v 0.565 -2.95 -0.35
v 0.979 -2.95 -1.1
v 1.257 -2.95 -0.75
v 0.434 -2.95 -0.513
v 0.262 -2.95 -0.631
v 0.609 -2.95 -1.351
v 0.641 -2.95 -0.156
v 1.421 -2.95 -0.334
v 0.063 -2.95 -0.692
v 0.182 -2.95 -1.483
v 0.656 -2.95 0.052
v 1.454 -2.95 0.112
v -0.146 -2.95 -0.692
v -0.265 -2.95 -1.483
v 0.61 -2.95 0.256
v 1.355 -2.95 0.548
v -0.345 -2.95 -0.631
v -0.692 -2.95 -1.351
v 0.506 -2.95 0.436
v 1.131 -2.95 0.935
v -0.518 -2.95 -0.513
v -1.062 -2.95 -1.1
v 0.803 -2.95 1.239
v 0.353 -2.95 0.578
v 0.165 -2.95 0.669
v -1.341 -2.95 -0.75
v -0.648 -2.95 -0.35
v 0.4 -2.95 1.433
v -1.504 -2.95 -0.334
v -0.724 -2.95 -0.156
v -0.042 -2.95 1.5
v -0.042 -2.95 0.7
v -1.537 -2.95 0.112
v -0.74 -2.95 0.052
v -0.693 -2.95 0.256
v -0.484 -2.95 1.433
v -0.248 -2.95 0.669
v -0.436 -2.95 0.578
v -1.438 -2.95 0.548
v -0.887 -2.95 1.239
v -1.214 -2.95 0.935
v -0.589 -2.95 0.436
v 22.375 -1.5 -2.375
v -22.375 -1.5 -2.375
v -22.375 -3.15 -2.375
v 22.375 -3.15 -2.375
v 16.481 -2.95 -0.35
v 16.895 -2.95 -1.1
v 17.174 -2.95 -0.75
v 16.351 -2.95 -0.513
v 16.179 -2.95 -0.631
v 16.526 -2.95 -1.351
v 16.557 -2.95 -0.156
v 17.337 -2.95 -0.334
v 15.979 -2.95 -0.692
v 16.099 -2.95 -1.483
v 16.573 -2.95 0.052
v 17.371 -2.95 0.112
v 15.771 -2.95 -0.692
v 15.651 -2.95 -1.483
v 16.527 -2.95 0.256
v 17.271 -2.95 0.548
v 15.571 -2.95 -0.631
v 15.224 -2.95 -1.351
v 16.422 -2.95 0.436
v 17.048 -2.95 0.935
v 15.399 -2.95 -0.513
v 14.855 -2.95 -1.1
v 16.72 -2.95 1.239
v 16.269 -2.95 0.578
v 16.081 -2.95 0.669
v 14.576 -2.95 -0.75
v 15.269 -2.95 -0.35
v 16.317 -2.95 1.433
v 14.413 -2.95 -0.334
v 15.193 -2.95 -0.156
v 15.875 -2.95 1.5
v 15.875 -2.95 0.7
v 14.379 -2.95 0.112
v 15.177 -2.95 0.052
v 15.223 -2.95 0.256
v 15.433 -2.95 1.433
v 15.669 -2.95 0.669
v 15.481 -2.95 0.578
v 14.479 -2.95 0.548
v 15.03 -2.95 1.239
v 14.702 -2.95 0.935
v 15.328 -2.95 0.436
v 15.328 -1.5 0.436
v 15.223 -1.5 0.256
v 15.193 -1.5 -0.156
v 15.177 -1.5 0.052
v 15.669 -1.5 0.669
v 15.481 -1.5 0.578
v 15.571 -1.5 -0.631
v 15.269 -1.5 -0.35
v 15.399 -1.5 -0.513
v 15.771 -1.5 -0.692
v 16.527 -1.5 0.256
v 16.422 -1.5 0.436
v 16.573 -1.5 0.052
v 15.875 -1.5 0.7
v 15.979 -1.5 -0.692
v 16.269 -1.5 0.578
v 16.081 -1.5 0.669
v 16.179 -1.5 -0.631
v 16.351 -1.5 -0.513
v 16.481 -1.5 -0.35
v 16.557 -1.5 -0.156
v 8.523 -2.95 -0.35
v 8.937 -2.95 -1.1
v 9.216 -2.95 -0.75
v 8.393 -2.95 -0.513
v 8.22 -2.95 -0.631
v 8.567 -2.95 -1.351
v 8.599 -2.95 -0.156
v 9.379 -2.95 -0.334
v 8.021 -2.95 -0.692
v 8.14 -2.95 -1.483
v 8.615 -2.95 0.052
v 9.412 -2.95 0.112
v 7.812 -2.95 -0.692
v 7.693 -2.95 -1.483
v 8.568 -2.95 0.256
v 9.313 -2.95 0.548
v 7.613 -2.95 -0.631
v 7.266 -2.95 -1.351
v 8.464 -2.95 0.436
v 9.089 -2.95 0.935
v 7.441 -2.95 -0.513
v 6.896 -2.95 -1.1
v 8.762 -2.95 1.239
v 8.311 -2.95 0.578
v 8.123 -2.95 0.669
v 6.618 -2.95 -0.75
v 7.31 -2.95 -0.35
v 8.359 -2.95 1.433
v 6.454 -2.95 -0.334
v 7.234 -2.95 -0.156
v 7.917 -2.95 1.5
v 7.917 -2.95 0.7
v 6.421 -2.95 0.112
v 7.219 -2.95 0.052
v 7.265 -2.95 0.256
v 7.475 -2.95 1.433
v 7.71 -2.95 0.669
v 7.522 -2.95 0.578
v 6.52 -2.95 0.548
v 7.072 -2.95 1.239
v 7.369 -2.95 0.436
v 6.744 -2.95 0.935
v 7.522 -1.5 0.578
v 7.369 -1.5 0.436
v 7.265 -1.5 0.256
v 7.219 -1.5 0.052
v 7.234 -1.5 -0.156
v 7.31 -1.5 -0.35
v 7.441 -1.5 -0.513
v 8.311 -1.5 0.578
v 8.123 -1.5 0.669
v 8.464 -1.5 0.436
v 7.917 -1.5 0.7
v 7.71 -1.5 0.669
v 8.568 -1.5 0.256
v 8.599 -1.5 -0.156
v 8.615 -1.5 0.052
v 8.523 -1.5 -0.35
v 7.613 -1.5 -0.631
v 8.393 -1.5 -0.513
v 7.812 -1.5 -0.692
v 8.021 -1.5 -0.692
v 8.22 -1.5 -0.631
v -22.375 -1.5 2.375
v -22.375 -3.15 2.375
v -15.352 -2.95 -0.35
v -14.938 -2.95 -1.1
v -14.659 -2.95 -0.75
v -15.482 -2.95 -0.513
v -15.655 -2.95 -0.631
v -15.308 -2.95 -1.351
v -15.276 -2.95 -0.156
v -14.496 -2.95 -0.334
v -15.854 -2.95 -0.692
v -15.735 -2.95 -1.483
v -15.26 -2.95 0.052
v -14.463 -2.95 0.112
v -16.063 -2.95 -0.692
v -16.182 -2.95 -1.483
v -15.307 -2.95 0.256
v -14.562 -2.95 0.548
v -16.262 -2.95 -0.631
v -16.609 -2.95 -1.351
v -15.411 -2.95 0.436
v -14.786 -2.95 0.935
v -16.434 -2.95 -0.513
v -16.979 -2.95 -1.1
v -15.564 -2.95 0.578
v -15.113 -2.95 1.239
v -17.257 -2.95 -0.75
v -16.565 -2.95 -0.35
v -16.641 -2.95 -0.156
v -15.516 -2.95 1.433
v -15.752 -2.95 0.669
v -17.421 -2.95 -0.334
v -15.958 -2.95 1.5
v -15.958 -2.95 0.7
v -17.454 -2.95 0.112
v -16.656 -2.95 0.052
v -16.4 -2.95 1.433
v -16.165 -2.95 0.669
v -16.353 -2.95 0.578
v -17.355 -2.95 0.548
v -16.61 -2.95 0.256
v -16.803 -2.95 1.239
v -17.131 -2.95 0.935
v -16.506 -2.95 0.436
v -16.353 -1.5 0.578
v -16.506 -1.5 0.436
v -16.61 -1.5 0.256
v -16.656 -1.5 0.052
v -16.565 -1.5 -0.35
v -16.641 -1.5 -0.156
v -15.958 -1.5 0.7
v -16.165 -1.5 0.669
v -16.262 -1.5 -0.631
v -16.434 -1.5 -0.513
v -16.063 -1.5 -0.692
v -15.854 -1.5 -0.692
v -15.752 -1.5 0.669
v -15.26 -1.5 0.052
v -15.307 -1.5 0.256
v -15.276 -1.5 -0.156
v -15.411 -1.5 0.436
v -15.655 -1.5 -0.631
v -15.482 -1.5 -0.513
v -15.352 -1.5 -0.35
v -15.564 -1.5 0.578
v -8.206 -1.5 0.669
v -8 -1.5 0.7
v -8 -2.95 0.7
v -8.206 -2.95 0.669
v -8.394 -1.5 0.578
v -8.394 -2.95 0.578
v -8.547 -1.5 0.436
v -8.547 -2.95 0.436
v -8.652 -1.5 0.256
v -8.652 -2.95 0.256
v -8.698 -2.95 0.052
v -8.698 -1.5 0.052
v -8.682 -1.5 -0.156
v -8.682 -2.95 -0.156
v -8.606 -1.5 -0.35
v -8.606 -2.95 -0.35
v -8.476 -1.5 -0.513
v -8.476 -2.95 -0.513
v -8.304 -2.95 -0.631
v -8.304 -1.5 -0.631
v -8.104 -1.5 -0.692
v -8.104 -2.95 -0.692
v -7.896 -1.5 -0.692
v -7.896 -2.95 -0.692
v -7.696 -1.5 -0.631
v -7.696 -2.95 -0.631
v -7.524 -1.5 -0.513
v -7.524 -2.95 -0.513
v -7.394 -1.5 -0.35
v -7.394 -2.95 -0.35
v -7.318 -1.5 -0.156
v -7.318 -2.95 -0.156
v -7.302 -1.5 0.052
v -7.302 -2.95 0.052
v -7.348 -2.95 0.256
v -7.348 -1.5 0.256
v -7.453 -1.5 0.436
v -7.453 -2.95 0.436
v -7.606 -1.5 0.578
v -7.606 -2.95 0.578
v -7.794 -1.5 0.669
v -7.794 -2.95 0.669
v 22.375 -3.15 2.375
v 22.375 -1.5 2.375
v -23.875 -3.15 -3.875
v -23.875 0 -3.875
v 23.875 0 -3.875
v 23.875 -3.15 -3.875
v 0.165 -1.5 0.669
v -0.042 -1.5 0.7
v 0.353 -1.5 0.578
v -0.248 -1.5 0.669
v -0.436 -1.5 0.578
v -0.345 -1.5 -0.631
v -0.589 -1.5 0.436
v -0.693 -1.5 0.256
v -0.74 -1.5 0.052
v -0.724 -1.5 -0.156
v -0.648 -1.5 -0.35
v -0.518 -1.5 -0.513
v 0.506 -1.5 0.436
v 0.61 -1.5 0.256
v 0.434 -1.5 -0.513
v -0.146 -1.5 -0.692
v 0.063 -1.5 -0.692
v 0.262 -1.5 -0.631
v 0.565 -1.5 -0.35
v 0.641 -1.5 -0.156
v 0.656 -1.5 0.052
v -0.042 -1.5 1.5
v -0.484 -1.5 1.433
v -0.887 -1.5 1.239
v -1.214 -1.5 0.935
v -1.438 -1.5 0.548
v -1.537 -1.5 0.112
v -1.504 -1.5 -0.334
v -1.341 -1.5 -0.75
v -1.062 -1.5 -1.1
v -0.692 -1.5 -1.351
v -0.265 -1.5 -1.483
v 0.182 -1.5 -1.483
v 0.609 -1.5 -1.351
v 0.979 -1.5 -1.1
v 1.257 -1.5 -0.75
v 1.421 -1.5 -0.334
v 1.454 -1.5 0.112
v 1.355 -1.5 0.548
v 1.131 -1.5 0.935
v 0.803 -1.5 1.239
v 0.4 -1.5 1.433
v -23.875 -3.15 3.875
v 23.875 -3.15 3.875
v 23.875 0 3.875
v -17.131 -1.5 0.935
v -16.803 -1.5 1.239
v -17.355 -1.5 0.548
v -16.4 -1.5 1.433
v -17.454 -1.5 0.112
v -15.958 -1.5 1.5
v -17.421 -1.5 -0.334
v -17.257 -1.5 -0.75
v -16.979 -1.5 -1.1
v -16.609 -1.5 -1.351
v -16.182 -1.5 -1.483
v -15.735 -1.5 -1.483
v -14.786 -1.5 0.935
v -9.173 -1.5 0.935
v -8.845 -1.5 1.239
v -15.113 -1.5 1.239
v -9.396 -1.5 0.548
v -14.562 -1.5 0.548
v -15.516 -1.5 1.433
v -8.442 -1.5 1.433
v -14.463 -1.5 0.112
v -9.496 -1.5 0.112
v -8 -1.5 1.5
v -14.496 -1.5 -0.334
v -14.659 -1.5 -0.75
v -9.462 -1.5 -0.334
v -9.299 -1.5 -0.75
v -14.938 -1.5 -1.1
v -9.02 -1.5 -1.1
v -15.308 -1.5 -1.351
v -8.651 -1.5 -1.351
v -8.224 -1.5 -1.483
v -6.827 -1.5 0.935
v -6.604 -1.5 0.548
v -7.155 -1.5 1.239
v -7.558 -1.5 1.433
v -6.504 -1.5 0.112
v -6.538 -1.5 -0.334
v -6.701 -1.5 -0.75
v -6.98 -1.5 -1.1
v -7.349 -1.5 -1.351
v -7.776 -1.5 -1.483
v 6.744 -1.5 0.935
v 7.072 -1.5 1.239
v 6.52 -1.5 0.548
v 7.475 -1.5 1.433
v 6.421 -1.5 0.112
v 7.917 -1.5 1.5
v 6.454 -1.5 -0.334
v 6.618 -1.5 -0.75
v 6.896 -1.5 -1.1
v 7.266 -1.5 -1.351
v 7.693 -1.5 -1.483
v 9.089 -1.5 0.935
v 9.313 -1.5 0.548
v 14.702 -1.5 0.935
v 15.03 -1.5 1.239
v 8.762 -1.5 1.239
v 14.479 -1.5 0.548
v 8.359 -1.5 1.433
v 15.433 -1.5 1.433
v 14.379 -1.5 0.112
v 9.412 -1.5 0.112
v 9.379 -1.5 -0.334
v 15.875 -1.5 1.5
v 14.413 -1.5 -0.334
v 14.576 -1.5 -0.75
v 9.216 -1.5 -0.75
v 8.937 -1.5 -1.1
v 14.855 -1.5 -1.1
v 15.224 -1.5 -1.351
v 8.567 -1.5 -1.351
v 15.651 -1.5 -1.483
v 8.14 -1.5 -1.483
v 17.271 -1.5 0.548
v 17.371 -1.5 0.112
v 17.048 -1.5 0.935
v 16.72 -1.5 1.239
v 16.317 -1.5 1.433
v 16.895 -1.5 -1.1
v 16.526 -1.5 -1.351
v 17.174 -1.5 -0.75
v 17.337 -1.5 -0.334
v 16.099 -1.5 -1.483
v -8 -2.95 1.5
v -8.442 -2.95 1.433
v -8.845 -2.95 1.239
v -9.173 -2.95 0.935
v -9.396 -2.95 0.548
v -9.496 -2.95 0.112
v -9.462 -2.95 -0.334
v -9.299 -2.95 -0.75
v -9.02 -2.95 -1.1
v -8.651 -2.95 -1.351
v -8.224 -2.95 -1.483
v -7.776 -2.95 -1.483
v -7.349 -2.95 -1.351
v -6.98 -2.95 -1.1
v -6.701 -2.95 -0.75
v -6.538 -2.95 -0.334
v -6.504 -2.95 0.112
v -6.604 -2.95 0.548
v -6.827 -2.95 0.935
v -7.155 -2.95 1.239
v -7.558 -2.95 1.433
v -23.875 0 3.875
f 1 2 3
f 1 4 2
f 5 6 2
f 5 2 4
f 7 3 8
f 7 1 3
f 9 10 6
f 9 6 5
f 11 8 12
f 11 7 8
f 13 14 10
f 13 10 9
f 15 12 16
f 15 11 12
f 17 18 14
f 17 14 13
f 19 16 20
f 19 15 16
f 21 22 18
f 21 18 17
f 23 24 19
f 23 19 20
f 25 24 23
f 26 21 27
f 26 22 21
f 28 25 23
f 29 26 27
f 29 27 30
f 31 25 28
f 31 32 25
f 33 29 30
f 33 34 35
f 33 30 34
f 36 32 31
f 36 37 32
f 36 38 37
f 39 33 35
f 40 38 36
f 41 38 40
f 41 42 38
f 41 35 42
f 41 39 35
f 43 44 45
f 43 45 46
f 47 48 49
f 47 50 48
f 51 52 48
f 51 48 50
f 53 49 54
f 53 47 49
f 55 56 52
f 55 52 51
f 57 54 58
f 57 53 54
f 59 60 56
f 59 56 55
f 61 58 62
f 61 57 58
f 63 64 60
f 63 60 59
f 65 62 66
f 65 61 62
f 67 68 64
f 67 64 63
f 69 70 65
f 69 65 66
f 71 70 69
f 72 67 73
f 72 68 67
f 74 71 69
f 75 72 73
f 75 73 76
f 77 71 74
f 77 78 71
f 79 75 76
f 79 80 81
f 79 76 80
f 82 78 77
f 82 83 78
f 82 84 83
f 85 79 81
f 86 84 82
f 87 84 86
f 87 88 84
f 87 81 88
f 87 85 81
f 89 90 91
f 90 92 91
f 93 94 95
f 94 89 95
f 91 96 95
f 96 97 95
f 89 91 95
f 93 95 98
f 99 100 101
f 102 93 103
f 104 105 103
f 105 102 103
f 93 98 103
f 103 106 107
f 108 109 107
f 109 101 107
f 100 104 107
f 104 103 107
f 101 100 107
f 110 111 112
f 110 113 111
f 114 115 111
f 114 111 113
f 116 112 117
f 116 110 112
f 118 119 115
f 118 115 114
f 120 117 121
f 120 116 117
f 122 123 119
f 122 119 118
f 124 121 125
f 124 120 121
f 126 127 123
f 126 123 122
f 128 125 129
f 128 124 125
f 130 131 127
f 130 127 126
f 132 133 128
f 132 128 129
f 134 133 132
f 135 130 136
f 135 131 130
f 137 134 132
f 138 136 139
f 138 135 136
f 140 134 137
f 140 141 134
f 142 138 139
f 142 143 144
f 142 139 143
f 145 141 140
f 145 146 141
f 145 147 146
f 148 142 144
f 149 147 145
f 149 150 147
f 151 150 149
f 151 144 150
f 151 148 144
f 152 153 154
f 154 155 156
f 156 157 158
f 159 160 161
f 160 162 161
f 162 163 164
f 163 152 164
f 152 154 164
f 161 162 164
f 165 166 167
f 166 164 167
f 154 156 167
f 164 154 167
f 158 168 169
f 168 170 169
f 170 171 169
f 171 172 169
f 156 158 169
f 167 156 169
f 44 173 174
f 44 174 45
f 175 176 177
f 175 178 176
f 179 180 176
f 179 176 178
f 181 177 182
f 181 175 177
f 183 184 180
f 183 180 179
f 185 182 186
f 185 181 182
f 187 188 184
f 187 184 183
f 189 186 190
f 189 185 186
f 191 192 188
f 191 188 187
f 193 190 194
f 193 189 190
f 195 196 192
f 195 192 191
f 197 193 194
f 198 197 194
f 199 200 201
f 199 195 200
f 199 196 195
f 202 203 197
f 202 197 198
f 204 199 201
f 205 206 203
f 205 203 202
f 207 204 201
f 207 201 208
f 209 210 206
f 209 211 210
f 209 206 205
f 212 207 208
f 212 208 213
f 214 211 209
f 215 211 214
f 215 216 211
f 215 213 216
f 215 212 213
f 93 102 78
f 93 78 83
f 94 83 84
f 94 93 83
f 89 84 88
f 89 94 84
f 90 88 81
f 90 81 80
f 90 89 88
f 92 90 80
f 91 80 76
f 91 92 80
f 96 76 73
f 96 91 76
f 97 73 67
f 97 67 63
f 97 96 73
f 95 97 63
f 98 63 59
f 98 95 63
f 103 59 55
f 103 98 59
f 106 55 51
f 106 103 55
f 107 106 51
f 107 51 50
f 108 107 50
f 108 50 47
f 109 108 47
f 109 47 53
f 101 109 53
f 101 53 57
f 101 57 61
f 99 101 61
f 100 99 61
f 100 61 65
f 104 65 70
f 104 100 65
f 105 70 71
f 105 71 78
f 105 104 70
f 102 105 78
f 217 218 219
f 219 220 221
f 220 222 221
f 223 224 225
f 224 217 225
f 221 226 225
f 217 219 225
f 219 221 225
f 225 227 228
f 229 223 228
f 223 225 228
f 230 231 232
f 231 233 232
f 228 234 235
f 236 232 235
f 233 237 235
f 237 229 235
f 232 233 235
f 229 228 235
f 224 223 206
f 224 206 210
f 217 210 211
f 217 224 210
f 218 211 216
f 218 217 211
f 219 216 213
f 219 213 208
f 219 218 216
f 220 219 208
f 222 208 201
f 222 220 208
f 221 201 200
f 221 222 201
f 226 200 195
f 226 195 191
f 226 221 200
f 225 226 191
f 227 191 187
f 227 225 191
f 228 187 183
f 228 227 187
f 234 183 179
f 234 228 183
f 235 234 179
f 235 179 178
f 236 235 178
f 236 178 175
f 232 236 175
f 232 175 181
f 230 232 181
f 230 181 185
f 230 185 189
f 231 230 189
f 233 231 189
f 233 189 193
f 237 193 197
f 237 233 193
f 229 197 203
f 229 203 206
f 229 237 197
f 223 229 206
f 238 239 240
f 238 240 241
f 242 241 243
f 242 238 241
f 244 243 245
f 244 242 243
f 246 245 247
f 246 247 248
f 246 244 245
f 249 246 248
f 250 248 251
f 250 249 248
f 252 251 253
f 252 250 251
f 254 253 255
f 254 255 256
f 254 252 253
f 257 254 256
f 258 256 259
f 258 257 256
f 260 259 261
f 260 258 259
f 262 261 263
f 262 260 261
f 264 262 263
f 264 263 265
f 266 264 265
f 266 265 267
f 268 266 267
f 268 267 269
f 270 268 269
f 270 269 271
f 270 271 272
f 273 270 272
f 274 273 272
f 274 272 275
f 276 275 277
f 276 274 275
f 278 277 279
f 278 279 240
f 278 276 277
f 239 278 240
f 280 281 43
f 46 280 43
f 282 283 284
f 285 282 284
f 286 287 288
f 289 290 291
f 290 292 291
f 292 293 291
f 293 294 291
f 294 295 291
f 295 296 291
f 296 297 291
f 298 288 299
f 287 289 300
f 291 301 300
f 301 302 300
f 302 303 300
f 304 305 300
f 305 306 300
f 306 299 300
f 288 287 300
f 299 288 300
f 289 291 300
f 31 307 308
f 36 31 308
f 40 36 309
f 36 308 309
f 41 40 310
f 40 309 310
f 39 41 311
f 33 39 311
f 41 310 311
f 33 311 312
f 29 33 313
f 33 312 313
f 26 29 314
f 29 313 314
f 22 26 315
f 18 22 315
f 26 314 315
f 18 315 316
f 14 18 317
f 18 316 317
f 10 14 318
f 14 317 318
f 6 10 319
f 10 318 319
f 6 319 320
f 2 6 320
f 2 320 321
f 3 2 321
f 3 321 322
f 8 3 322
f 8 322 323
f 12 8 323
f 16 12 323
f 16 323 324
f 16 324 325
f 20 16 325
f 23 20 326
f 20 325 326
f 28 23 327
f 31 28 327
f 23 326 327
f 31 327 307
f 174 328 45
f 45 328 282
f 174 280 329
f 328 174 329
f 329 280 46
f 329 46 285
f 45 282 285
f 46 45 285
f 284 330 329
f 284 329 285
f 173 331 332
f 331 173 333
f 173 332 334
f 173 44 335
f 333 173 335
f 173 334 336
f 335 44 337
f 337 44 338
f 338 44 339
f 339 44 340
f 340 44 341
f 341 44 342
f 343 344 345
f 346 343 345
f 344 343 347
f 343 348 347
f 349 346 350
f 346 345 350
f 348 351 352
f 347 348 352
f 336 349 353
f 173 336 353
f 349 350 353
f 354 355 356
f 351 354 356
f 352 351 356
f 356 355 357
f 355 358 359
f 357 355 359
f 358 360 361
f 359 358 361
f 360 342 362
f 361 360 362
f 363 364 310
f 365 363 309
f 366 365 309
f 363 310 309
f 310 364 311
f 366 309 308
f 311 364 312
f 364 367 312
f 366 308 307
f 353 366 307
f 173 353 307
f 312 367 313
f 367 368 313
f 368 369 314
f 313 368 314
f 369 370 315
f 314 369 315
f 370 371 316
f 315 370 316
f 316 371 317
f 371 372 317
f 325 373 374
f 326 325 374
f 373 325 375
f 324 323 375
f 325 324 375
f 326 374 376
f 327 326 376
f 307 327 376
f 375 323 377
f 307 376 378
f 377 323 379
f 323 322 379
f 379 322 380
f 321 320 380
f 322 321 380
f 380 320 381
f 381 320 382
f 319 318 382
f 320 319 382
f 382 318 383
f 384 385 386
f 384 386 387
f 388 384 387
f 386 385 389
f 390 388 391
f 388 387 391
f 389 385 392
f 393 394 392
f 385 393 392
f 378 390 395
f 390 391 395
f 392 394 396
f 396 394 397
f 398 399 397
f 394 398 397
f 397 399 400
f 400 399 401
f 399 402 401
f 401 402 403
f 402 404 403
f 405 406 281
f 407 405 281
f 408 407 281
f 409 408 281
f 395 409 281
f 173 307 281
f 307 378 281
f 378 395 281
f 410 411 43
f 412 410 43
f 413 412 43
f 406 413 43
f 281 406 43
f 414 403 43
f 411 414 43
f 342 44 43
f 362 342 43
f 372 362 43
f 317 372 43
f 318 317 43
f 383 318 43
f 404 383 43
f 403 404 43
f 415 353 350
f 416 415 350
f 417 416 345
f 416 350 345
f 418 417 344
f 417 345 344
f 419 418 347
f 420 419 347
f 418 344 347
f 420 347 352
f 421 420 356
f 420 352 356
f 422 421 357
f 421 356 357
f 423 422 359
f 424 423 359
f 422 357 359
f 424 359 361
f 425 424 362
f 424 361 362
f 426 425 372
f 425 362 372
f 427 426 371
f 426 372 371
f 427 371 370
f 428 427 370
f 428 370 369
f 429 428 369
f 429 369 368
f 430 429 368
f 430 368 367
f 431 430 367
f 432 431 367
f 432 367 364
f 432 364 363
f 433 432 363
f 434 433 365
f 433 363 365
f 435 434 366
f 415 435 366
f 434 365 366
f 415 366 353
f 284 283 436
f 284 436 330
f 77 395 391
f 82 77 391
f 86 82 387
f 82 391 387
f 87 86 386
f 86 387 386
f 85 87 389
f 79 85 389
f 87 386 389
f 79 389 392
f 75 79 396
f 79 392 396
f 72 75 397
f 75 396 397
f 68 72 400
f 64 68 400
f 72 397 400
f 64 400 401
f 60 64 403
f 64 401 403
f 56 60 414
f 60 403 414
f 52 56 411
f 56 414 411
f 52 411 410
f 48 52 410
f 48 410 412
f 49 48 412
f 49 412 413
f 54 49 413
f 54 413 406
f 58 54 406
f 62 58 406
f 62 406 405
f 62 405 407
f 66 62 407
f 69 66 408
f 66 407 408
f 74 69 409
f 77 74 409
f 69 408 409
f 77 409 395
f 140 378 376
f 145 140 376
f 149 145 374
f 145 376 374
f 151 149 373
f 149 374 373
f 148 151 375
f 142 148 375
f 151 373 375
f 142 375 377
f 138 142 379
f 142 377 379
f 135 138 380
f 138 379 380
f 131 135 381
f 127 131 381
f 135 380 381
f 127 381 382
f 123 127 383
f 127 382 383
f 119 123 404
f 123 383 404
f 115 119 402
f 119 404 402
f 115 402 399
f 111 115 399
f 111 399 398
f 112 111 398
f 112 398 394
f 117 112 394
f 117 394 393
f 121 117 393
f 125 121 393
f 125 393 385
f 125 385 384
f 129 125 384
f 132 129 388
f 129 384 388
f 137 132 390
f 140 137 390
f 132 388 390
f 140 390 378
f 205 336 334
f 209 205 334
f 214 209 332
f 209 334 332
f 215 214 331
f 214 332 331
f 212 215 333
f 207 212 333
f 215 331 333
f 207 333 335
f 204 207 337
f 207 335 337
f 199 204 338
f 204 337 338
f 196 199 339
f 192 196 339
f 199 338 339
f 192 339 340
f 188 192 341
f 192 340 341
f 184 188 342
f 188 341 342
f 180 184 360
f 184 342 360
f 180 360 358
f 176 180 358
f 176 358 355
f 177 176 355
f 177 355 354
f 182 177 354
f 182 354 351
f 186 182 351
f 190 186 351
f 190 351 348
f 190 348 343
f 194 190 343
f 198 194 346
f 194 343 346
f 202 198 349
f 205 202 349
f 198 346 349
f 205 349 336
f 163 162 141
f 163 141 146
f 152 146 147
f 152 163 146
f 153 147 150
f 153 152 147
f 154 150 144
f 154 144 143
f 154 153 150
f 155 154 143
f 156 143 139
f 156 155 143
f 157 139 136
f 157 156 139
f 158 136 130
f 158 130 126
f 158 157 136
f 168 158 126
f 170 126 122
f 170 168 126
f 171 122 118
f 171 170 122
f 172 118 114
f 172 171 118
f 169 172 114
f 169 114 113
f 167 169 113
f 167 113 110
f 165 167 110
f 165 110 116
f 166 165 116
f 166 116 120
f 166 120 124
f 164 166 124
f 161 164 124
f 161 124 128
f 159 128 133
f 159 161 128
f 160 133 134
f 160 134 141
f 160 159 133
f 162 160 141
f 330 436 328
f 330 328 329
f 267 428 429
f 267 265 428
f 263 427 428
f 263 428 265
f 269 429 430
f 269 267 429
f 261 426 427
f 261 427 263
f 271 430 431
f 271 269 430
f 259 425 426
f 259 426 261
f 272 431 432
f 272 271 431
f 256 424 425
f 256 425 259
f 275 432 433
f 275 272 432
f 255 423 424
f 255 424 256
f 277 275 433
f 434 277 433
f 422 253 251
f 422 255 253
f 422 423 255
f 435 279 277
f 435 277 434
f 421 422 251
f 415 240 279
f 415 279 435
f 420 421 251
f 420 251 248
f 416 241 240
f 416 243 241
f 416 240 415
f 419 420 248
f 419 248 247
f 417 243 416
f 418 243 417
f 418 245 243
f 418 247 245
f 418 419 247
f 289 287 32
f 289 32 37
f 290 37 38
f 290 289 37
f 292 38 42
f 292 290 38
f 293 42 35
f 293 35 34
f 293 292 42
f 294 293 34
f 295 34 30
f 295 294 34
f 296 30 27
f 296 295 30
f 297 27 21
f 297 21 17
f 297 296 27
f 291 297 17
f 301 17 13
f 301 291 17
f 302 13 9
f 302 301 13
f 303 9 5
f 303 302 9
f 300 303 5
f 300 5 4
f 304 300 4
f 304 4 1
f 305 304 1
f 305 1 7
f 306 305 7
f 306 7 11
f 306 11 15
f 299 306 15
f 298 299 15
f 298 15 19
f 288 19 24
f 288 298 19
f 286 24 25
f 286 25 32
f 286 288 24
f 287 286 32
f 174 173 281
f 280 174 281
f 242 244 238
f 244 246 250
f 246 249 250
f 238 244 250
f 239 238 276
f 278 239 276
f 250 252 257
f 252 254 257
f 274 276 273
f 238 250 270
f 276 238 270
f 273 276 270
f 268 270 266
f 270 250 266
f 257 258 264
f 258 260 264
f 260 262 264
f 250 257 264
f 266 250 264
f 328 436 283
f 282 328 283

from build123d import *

# Parameters (mm, degrees)
SKETCH1_W           = 47.75
SKETCH1_H           = 7.75
BOSS_EXTRUDE1_DEPTH = 3.15
SHELL1_T            = -1.5
SKETCH2_R           = 1.5
SKETCH2_R_2         = 0.7
BOSS_EXTRUDE2_DEPTH = 1.45


with BuildPart() as part:
    # Sketch1 → Boss-Extrude1 (new body)
    with BuildSketch(Plane(origin=(0, 0, 0), x_dir=(1, 0, 0), z_dir=(0, 1, 0))):
        Rectangle(SKETCH1_W, SKETCH1_H)
    extrude(amount=-BOSS_EXTRUDE1_DEPTH)

    # Shell1
    shell1_openings = [part.faces().sort_by_distance(p)[0] for p in [
        (0, -3.15, 0),
    ]]
    offset(amount=SHELL1_T, openings=shell1_openings, kind=Kind.INTERSECTION)

    # Sketch2 → Boss-Extrude2 (add)
    # profile 1 of 5: a face of its own
    with BuildSketch(Plane.XZ.offset(1.5)):
        with Locations(Location((-15.958333333, 0, 0), (0, 0, 90))):
            Circle(SKETCH2_R)
        with Locations(Location((-15.958333333, 0, 0), (0, 0, 90))):
            Circle(SKETCH2_R_2, mode=Mode.SUBTRACT)
    # profile 2 of 5: a face of its own
    with BuildSketch(Plane.XZ.offset(1.5)):
        with Locations(Location((-8, 0, 0), (0, 0, 90))):
            Circle(SKETCH2_R)
        with Locations(Location((-8, 0, 0), (0, 0, 90))):
            Circle(SKETCH2_R_2, mode=Mode.SUBTRACT)
    # profile 3 of 5: a face of its own
    with BuildSketch(Plane.XZ.offset(1.5)):
        with Locations(Location((-0.041666667, 0, 0), (0, 0, 90))):
            Circle(SKETCH2_R)
        with Locations(Location((-0.041666667, 0, 0), (0, 0, 90))):
            Circle(SKETCH2_R_2, mode=Mode.SUBTRACT)
    # profile 4 of 5: a face of its own
    with BuildSketch(Plane.XZ.offset(1.5)):
        with Locations(Location((7.916666667, 0, 0), (0, 0, 90))):
            Circle(SKETCH2_R)
        with Locations(Location((7.916666667, 0, 0), (0, 0, 90))):
            Circle(SKETCH2_R_2, mode=Mode.SUBTRACT)
    # profile 5 of 5: a face of its own
    with BuildSketch(Plane.XZ.offset(1.5)):
        with Locations(Location((15.875, 0, 0), (0, 0, 90))):
            Circle(SKETCH2_R)
        with Locations(Location((15.875, 0, 0), (0, 0, 90))):
            Circle(SKETCH2_R_2, mode=Mode.SUBTRACT)
    extrude(amount=BOSS_EXTRUDE2_DEPTH)


solid = part.part
